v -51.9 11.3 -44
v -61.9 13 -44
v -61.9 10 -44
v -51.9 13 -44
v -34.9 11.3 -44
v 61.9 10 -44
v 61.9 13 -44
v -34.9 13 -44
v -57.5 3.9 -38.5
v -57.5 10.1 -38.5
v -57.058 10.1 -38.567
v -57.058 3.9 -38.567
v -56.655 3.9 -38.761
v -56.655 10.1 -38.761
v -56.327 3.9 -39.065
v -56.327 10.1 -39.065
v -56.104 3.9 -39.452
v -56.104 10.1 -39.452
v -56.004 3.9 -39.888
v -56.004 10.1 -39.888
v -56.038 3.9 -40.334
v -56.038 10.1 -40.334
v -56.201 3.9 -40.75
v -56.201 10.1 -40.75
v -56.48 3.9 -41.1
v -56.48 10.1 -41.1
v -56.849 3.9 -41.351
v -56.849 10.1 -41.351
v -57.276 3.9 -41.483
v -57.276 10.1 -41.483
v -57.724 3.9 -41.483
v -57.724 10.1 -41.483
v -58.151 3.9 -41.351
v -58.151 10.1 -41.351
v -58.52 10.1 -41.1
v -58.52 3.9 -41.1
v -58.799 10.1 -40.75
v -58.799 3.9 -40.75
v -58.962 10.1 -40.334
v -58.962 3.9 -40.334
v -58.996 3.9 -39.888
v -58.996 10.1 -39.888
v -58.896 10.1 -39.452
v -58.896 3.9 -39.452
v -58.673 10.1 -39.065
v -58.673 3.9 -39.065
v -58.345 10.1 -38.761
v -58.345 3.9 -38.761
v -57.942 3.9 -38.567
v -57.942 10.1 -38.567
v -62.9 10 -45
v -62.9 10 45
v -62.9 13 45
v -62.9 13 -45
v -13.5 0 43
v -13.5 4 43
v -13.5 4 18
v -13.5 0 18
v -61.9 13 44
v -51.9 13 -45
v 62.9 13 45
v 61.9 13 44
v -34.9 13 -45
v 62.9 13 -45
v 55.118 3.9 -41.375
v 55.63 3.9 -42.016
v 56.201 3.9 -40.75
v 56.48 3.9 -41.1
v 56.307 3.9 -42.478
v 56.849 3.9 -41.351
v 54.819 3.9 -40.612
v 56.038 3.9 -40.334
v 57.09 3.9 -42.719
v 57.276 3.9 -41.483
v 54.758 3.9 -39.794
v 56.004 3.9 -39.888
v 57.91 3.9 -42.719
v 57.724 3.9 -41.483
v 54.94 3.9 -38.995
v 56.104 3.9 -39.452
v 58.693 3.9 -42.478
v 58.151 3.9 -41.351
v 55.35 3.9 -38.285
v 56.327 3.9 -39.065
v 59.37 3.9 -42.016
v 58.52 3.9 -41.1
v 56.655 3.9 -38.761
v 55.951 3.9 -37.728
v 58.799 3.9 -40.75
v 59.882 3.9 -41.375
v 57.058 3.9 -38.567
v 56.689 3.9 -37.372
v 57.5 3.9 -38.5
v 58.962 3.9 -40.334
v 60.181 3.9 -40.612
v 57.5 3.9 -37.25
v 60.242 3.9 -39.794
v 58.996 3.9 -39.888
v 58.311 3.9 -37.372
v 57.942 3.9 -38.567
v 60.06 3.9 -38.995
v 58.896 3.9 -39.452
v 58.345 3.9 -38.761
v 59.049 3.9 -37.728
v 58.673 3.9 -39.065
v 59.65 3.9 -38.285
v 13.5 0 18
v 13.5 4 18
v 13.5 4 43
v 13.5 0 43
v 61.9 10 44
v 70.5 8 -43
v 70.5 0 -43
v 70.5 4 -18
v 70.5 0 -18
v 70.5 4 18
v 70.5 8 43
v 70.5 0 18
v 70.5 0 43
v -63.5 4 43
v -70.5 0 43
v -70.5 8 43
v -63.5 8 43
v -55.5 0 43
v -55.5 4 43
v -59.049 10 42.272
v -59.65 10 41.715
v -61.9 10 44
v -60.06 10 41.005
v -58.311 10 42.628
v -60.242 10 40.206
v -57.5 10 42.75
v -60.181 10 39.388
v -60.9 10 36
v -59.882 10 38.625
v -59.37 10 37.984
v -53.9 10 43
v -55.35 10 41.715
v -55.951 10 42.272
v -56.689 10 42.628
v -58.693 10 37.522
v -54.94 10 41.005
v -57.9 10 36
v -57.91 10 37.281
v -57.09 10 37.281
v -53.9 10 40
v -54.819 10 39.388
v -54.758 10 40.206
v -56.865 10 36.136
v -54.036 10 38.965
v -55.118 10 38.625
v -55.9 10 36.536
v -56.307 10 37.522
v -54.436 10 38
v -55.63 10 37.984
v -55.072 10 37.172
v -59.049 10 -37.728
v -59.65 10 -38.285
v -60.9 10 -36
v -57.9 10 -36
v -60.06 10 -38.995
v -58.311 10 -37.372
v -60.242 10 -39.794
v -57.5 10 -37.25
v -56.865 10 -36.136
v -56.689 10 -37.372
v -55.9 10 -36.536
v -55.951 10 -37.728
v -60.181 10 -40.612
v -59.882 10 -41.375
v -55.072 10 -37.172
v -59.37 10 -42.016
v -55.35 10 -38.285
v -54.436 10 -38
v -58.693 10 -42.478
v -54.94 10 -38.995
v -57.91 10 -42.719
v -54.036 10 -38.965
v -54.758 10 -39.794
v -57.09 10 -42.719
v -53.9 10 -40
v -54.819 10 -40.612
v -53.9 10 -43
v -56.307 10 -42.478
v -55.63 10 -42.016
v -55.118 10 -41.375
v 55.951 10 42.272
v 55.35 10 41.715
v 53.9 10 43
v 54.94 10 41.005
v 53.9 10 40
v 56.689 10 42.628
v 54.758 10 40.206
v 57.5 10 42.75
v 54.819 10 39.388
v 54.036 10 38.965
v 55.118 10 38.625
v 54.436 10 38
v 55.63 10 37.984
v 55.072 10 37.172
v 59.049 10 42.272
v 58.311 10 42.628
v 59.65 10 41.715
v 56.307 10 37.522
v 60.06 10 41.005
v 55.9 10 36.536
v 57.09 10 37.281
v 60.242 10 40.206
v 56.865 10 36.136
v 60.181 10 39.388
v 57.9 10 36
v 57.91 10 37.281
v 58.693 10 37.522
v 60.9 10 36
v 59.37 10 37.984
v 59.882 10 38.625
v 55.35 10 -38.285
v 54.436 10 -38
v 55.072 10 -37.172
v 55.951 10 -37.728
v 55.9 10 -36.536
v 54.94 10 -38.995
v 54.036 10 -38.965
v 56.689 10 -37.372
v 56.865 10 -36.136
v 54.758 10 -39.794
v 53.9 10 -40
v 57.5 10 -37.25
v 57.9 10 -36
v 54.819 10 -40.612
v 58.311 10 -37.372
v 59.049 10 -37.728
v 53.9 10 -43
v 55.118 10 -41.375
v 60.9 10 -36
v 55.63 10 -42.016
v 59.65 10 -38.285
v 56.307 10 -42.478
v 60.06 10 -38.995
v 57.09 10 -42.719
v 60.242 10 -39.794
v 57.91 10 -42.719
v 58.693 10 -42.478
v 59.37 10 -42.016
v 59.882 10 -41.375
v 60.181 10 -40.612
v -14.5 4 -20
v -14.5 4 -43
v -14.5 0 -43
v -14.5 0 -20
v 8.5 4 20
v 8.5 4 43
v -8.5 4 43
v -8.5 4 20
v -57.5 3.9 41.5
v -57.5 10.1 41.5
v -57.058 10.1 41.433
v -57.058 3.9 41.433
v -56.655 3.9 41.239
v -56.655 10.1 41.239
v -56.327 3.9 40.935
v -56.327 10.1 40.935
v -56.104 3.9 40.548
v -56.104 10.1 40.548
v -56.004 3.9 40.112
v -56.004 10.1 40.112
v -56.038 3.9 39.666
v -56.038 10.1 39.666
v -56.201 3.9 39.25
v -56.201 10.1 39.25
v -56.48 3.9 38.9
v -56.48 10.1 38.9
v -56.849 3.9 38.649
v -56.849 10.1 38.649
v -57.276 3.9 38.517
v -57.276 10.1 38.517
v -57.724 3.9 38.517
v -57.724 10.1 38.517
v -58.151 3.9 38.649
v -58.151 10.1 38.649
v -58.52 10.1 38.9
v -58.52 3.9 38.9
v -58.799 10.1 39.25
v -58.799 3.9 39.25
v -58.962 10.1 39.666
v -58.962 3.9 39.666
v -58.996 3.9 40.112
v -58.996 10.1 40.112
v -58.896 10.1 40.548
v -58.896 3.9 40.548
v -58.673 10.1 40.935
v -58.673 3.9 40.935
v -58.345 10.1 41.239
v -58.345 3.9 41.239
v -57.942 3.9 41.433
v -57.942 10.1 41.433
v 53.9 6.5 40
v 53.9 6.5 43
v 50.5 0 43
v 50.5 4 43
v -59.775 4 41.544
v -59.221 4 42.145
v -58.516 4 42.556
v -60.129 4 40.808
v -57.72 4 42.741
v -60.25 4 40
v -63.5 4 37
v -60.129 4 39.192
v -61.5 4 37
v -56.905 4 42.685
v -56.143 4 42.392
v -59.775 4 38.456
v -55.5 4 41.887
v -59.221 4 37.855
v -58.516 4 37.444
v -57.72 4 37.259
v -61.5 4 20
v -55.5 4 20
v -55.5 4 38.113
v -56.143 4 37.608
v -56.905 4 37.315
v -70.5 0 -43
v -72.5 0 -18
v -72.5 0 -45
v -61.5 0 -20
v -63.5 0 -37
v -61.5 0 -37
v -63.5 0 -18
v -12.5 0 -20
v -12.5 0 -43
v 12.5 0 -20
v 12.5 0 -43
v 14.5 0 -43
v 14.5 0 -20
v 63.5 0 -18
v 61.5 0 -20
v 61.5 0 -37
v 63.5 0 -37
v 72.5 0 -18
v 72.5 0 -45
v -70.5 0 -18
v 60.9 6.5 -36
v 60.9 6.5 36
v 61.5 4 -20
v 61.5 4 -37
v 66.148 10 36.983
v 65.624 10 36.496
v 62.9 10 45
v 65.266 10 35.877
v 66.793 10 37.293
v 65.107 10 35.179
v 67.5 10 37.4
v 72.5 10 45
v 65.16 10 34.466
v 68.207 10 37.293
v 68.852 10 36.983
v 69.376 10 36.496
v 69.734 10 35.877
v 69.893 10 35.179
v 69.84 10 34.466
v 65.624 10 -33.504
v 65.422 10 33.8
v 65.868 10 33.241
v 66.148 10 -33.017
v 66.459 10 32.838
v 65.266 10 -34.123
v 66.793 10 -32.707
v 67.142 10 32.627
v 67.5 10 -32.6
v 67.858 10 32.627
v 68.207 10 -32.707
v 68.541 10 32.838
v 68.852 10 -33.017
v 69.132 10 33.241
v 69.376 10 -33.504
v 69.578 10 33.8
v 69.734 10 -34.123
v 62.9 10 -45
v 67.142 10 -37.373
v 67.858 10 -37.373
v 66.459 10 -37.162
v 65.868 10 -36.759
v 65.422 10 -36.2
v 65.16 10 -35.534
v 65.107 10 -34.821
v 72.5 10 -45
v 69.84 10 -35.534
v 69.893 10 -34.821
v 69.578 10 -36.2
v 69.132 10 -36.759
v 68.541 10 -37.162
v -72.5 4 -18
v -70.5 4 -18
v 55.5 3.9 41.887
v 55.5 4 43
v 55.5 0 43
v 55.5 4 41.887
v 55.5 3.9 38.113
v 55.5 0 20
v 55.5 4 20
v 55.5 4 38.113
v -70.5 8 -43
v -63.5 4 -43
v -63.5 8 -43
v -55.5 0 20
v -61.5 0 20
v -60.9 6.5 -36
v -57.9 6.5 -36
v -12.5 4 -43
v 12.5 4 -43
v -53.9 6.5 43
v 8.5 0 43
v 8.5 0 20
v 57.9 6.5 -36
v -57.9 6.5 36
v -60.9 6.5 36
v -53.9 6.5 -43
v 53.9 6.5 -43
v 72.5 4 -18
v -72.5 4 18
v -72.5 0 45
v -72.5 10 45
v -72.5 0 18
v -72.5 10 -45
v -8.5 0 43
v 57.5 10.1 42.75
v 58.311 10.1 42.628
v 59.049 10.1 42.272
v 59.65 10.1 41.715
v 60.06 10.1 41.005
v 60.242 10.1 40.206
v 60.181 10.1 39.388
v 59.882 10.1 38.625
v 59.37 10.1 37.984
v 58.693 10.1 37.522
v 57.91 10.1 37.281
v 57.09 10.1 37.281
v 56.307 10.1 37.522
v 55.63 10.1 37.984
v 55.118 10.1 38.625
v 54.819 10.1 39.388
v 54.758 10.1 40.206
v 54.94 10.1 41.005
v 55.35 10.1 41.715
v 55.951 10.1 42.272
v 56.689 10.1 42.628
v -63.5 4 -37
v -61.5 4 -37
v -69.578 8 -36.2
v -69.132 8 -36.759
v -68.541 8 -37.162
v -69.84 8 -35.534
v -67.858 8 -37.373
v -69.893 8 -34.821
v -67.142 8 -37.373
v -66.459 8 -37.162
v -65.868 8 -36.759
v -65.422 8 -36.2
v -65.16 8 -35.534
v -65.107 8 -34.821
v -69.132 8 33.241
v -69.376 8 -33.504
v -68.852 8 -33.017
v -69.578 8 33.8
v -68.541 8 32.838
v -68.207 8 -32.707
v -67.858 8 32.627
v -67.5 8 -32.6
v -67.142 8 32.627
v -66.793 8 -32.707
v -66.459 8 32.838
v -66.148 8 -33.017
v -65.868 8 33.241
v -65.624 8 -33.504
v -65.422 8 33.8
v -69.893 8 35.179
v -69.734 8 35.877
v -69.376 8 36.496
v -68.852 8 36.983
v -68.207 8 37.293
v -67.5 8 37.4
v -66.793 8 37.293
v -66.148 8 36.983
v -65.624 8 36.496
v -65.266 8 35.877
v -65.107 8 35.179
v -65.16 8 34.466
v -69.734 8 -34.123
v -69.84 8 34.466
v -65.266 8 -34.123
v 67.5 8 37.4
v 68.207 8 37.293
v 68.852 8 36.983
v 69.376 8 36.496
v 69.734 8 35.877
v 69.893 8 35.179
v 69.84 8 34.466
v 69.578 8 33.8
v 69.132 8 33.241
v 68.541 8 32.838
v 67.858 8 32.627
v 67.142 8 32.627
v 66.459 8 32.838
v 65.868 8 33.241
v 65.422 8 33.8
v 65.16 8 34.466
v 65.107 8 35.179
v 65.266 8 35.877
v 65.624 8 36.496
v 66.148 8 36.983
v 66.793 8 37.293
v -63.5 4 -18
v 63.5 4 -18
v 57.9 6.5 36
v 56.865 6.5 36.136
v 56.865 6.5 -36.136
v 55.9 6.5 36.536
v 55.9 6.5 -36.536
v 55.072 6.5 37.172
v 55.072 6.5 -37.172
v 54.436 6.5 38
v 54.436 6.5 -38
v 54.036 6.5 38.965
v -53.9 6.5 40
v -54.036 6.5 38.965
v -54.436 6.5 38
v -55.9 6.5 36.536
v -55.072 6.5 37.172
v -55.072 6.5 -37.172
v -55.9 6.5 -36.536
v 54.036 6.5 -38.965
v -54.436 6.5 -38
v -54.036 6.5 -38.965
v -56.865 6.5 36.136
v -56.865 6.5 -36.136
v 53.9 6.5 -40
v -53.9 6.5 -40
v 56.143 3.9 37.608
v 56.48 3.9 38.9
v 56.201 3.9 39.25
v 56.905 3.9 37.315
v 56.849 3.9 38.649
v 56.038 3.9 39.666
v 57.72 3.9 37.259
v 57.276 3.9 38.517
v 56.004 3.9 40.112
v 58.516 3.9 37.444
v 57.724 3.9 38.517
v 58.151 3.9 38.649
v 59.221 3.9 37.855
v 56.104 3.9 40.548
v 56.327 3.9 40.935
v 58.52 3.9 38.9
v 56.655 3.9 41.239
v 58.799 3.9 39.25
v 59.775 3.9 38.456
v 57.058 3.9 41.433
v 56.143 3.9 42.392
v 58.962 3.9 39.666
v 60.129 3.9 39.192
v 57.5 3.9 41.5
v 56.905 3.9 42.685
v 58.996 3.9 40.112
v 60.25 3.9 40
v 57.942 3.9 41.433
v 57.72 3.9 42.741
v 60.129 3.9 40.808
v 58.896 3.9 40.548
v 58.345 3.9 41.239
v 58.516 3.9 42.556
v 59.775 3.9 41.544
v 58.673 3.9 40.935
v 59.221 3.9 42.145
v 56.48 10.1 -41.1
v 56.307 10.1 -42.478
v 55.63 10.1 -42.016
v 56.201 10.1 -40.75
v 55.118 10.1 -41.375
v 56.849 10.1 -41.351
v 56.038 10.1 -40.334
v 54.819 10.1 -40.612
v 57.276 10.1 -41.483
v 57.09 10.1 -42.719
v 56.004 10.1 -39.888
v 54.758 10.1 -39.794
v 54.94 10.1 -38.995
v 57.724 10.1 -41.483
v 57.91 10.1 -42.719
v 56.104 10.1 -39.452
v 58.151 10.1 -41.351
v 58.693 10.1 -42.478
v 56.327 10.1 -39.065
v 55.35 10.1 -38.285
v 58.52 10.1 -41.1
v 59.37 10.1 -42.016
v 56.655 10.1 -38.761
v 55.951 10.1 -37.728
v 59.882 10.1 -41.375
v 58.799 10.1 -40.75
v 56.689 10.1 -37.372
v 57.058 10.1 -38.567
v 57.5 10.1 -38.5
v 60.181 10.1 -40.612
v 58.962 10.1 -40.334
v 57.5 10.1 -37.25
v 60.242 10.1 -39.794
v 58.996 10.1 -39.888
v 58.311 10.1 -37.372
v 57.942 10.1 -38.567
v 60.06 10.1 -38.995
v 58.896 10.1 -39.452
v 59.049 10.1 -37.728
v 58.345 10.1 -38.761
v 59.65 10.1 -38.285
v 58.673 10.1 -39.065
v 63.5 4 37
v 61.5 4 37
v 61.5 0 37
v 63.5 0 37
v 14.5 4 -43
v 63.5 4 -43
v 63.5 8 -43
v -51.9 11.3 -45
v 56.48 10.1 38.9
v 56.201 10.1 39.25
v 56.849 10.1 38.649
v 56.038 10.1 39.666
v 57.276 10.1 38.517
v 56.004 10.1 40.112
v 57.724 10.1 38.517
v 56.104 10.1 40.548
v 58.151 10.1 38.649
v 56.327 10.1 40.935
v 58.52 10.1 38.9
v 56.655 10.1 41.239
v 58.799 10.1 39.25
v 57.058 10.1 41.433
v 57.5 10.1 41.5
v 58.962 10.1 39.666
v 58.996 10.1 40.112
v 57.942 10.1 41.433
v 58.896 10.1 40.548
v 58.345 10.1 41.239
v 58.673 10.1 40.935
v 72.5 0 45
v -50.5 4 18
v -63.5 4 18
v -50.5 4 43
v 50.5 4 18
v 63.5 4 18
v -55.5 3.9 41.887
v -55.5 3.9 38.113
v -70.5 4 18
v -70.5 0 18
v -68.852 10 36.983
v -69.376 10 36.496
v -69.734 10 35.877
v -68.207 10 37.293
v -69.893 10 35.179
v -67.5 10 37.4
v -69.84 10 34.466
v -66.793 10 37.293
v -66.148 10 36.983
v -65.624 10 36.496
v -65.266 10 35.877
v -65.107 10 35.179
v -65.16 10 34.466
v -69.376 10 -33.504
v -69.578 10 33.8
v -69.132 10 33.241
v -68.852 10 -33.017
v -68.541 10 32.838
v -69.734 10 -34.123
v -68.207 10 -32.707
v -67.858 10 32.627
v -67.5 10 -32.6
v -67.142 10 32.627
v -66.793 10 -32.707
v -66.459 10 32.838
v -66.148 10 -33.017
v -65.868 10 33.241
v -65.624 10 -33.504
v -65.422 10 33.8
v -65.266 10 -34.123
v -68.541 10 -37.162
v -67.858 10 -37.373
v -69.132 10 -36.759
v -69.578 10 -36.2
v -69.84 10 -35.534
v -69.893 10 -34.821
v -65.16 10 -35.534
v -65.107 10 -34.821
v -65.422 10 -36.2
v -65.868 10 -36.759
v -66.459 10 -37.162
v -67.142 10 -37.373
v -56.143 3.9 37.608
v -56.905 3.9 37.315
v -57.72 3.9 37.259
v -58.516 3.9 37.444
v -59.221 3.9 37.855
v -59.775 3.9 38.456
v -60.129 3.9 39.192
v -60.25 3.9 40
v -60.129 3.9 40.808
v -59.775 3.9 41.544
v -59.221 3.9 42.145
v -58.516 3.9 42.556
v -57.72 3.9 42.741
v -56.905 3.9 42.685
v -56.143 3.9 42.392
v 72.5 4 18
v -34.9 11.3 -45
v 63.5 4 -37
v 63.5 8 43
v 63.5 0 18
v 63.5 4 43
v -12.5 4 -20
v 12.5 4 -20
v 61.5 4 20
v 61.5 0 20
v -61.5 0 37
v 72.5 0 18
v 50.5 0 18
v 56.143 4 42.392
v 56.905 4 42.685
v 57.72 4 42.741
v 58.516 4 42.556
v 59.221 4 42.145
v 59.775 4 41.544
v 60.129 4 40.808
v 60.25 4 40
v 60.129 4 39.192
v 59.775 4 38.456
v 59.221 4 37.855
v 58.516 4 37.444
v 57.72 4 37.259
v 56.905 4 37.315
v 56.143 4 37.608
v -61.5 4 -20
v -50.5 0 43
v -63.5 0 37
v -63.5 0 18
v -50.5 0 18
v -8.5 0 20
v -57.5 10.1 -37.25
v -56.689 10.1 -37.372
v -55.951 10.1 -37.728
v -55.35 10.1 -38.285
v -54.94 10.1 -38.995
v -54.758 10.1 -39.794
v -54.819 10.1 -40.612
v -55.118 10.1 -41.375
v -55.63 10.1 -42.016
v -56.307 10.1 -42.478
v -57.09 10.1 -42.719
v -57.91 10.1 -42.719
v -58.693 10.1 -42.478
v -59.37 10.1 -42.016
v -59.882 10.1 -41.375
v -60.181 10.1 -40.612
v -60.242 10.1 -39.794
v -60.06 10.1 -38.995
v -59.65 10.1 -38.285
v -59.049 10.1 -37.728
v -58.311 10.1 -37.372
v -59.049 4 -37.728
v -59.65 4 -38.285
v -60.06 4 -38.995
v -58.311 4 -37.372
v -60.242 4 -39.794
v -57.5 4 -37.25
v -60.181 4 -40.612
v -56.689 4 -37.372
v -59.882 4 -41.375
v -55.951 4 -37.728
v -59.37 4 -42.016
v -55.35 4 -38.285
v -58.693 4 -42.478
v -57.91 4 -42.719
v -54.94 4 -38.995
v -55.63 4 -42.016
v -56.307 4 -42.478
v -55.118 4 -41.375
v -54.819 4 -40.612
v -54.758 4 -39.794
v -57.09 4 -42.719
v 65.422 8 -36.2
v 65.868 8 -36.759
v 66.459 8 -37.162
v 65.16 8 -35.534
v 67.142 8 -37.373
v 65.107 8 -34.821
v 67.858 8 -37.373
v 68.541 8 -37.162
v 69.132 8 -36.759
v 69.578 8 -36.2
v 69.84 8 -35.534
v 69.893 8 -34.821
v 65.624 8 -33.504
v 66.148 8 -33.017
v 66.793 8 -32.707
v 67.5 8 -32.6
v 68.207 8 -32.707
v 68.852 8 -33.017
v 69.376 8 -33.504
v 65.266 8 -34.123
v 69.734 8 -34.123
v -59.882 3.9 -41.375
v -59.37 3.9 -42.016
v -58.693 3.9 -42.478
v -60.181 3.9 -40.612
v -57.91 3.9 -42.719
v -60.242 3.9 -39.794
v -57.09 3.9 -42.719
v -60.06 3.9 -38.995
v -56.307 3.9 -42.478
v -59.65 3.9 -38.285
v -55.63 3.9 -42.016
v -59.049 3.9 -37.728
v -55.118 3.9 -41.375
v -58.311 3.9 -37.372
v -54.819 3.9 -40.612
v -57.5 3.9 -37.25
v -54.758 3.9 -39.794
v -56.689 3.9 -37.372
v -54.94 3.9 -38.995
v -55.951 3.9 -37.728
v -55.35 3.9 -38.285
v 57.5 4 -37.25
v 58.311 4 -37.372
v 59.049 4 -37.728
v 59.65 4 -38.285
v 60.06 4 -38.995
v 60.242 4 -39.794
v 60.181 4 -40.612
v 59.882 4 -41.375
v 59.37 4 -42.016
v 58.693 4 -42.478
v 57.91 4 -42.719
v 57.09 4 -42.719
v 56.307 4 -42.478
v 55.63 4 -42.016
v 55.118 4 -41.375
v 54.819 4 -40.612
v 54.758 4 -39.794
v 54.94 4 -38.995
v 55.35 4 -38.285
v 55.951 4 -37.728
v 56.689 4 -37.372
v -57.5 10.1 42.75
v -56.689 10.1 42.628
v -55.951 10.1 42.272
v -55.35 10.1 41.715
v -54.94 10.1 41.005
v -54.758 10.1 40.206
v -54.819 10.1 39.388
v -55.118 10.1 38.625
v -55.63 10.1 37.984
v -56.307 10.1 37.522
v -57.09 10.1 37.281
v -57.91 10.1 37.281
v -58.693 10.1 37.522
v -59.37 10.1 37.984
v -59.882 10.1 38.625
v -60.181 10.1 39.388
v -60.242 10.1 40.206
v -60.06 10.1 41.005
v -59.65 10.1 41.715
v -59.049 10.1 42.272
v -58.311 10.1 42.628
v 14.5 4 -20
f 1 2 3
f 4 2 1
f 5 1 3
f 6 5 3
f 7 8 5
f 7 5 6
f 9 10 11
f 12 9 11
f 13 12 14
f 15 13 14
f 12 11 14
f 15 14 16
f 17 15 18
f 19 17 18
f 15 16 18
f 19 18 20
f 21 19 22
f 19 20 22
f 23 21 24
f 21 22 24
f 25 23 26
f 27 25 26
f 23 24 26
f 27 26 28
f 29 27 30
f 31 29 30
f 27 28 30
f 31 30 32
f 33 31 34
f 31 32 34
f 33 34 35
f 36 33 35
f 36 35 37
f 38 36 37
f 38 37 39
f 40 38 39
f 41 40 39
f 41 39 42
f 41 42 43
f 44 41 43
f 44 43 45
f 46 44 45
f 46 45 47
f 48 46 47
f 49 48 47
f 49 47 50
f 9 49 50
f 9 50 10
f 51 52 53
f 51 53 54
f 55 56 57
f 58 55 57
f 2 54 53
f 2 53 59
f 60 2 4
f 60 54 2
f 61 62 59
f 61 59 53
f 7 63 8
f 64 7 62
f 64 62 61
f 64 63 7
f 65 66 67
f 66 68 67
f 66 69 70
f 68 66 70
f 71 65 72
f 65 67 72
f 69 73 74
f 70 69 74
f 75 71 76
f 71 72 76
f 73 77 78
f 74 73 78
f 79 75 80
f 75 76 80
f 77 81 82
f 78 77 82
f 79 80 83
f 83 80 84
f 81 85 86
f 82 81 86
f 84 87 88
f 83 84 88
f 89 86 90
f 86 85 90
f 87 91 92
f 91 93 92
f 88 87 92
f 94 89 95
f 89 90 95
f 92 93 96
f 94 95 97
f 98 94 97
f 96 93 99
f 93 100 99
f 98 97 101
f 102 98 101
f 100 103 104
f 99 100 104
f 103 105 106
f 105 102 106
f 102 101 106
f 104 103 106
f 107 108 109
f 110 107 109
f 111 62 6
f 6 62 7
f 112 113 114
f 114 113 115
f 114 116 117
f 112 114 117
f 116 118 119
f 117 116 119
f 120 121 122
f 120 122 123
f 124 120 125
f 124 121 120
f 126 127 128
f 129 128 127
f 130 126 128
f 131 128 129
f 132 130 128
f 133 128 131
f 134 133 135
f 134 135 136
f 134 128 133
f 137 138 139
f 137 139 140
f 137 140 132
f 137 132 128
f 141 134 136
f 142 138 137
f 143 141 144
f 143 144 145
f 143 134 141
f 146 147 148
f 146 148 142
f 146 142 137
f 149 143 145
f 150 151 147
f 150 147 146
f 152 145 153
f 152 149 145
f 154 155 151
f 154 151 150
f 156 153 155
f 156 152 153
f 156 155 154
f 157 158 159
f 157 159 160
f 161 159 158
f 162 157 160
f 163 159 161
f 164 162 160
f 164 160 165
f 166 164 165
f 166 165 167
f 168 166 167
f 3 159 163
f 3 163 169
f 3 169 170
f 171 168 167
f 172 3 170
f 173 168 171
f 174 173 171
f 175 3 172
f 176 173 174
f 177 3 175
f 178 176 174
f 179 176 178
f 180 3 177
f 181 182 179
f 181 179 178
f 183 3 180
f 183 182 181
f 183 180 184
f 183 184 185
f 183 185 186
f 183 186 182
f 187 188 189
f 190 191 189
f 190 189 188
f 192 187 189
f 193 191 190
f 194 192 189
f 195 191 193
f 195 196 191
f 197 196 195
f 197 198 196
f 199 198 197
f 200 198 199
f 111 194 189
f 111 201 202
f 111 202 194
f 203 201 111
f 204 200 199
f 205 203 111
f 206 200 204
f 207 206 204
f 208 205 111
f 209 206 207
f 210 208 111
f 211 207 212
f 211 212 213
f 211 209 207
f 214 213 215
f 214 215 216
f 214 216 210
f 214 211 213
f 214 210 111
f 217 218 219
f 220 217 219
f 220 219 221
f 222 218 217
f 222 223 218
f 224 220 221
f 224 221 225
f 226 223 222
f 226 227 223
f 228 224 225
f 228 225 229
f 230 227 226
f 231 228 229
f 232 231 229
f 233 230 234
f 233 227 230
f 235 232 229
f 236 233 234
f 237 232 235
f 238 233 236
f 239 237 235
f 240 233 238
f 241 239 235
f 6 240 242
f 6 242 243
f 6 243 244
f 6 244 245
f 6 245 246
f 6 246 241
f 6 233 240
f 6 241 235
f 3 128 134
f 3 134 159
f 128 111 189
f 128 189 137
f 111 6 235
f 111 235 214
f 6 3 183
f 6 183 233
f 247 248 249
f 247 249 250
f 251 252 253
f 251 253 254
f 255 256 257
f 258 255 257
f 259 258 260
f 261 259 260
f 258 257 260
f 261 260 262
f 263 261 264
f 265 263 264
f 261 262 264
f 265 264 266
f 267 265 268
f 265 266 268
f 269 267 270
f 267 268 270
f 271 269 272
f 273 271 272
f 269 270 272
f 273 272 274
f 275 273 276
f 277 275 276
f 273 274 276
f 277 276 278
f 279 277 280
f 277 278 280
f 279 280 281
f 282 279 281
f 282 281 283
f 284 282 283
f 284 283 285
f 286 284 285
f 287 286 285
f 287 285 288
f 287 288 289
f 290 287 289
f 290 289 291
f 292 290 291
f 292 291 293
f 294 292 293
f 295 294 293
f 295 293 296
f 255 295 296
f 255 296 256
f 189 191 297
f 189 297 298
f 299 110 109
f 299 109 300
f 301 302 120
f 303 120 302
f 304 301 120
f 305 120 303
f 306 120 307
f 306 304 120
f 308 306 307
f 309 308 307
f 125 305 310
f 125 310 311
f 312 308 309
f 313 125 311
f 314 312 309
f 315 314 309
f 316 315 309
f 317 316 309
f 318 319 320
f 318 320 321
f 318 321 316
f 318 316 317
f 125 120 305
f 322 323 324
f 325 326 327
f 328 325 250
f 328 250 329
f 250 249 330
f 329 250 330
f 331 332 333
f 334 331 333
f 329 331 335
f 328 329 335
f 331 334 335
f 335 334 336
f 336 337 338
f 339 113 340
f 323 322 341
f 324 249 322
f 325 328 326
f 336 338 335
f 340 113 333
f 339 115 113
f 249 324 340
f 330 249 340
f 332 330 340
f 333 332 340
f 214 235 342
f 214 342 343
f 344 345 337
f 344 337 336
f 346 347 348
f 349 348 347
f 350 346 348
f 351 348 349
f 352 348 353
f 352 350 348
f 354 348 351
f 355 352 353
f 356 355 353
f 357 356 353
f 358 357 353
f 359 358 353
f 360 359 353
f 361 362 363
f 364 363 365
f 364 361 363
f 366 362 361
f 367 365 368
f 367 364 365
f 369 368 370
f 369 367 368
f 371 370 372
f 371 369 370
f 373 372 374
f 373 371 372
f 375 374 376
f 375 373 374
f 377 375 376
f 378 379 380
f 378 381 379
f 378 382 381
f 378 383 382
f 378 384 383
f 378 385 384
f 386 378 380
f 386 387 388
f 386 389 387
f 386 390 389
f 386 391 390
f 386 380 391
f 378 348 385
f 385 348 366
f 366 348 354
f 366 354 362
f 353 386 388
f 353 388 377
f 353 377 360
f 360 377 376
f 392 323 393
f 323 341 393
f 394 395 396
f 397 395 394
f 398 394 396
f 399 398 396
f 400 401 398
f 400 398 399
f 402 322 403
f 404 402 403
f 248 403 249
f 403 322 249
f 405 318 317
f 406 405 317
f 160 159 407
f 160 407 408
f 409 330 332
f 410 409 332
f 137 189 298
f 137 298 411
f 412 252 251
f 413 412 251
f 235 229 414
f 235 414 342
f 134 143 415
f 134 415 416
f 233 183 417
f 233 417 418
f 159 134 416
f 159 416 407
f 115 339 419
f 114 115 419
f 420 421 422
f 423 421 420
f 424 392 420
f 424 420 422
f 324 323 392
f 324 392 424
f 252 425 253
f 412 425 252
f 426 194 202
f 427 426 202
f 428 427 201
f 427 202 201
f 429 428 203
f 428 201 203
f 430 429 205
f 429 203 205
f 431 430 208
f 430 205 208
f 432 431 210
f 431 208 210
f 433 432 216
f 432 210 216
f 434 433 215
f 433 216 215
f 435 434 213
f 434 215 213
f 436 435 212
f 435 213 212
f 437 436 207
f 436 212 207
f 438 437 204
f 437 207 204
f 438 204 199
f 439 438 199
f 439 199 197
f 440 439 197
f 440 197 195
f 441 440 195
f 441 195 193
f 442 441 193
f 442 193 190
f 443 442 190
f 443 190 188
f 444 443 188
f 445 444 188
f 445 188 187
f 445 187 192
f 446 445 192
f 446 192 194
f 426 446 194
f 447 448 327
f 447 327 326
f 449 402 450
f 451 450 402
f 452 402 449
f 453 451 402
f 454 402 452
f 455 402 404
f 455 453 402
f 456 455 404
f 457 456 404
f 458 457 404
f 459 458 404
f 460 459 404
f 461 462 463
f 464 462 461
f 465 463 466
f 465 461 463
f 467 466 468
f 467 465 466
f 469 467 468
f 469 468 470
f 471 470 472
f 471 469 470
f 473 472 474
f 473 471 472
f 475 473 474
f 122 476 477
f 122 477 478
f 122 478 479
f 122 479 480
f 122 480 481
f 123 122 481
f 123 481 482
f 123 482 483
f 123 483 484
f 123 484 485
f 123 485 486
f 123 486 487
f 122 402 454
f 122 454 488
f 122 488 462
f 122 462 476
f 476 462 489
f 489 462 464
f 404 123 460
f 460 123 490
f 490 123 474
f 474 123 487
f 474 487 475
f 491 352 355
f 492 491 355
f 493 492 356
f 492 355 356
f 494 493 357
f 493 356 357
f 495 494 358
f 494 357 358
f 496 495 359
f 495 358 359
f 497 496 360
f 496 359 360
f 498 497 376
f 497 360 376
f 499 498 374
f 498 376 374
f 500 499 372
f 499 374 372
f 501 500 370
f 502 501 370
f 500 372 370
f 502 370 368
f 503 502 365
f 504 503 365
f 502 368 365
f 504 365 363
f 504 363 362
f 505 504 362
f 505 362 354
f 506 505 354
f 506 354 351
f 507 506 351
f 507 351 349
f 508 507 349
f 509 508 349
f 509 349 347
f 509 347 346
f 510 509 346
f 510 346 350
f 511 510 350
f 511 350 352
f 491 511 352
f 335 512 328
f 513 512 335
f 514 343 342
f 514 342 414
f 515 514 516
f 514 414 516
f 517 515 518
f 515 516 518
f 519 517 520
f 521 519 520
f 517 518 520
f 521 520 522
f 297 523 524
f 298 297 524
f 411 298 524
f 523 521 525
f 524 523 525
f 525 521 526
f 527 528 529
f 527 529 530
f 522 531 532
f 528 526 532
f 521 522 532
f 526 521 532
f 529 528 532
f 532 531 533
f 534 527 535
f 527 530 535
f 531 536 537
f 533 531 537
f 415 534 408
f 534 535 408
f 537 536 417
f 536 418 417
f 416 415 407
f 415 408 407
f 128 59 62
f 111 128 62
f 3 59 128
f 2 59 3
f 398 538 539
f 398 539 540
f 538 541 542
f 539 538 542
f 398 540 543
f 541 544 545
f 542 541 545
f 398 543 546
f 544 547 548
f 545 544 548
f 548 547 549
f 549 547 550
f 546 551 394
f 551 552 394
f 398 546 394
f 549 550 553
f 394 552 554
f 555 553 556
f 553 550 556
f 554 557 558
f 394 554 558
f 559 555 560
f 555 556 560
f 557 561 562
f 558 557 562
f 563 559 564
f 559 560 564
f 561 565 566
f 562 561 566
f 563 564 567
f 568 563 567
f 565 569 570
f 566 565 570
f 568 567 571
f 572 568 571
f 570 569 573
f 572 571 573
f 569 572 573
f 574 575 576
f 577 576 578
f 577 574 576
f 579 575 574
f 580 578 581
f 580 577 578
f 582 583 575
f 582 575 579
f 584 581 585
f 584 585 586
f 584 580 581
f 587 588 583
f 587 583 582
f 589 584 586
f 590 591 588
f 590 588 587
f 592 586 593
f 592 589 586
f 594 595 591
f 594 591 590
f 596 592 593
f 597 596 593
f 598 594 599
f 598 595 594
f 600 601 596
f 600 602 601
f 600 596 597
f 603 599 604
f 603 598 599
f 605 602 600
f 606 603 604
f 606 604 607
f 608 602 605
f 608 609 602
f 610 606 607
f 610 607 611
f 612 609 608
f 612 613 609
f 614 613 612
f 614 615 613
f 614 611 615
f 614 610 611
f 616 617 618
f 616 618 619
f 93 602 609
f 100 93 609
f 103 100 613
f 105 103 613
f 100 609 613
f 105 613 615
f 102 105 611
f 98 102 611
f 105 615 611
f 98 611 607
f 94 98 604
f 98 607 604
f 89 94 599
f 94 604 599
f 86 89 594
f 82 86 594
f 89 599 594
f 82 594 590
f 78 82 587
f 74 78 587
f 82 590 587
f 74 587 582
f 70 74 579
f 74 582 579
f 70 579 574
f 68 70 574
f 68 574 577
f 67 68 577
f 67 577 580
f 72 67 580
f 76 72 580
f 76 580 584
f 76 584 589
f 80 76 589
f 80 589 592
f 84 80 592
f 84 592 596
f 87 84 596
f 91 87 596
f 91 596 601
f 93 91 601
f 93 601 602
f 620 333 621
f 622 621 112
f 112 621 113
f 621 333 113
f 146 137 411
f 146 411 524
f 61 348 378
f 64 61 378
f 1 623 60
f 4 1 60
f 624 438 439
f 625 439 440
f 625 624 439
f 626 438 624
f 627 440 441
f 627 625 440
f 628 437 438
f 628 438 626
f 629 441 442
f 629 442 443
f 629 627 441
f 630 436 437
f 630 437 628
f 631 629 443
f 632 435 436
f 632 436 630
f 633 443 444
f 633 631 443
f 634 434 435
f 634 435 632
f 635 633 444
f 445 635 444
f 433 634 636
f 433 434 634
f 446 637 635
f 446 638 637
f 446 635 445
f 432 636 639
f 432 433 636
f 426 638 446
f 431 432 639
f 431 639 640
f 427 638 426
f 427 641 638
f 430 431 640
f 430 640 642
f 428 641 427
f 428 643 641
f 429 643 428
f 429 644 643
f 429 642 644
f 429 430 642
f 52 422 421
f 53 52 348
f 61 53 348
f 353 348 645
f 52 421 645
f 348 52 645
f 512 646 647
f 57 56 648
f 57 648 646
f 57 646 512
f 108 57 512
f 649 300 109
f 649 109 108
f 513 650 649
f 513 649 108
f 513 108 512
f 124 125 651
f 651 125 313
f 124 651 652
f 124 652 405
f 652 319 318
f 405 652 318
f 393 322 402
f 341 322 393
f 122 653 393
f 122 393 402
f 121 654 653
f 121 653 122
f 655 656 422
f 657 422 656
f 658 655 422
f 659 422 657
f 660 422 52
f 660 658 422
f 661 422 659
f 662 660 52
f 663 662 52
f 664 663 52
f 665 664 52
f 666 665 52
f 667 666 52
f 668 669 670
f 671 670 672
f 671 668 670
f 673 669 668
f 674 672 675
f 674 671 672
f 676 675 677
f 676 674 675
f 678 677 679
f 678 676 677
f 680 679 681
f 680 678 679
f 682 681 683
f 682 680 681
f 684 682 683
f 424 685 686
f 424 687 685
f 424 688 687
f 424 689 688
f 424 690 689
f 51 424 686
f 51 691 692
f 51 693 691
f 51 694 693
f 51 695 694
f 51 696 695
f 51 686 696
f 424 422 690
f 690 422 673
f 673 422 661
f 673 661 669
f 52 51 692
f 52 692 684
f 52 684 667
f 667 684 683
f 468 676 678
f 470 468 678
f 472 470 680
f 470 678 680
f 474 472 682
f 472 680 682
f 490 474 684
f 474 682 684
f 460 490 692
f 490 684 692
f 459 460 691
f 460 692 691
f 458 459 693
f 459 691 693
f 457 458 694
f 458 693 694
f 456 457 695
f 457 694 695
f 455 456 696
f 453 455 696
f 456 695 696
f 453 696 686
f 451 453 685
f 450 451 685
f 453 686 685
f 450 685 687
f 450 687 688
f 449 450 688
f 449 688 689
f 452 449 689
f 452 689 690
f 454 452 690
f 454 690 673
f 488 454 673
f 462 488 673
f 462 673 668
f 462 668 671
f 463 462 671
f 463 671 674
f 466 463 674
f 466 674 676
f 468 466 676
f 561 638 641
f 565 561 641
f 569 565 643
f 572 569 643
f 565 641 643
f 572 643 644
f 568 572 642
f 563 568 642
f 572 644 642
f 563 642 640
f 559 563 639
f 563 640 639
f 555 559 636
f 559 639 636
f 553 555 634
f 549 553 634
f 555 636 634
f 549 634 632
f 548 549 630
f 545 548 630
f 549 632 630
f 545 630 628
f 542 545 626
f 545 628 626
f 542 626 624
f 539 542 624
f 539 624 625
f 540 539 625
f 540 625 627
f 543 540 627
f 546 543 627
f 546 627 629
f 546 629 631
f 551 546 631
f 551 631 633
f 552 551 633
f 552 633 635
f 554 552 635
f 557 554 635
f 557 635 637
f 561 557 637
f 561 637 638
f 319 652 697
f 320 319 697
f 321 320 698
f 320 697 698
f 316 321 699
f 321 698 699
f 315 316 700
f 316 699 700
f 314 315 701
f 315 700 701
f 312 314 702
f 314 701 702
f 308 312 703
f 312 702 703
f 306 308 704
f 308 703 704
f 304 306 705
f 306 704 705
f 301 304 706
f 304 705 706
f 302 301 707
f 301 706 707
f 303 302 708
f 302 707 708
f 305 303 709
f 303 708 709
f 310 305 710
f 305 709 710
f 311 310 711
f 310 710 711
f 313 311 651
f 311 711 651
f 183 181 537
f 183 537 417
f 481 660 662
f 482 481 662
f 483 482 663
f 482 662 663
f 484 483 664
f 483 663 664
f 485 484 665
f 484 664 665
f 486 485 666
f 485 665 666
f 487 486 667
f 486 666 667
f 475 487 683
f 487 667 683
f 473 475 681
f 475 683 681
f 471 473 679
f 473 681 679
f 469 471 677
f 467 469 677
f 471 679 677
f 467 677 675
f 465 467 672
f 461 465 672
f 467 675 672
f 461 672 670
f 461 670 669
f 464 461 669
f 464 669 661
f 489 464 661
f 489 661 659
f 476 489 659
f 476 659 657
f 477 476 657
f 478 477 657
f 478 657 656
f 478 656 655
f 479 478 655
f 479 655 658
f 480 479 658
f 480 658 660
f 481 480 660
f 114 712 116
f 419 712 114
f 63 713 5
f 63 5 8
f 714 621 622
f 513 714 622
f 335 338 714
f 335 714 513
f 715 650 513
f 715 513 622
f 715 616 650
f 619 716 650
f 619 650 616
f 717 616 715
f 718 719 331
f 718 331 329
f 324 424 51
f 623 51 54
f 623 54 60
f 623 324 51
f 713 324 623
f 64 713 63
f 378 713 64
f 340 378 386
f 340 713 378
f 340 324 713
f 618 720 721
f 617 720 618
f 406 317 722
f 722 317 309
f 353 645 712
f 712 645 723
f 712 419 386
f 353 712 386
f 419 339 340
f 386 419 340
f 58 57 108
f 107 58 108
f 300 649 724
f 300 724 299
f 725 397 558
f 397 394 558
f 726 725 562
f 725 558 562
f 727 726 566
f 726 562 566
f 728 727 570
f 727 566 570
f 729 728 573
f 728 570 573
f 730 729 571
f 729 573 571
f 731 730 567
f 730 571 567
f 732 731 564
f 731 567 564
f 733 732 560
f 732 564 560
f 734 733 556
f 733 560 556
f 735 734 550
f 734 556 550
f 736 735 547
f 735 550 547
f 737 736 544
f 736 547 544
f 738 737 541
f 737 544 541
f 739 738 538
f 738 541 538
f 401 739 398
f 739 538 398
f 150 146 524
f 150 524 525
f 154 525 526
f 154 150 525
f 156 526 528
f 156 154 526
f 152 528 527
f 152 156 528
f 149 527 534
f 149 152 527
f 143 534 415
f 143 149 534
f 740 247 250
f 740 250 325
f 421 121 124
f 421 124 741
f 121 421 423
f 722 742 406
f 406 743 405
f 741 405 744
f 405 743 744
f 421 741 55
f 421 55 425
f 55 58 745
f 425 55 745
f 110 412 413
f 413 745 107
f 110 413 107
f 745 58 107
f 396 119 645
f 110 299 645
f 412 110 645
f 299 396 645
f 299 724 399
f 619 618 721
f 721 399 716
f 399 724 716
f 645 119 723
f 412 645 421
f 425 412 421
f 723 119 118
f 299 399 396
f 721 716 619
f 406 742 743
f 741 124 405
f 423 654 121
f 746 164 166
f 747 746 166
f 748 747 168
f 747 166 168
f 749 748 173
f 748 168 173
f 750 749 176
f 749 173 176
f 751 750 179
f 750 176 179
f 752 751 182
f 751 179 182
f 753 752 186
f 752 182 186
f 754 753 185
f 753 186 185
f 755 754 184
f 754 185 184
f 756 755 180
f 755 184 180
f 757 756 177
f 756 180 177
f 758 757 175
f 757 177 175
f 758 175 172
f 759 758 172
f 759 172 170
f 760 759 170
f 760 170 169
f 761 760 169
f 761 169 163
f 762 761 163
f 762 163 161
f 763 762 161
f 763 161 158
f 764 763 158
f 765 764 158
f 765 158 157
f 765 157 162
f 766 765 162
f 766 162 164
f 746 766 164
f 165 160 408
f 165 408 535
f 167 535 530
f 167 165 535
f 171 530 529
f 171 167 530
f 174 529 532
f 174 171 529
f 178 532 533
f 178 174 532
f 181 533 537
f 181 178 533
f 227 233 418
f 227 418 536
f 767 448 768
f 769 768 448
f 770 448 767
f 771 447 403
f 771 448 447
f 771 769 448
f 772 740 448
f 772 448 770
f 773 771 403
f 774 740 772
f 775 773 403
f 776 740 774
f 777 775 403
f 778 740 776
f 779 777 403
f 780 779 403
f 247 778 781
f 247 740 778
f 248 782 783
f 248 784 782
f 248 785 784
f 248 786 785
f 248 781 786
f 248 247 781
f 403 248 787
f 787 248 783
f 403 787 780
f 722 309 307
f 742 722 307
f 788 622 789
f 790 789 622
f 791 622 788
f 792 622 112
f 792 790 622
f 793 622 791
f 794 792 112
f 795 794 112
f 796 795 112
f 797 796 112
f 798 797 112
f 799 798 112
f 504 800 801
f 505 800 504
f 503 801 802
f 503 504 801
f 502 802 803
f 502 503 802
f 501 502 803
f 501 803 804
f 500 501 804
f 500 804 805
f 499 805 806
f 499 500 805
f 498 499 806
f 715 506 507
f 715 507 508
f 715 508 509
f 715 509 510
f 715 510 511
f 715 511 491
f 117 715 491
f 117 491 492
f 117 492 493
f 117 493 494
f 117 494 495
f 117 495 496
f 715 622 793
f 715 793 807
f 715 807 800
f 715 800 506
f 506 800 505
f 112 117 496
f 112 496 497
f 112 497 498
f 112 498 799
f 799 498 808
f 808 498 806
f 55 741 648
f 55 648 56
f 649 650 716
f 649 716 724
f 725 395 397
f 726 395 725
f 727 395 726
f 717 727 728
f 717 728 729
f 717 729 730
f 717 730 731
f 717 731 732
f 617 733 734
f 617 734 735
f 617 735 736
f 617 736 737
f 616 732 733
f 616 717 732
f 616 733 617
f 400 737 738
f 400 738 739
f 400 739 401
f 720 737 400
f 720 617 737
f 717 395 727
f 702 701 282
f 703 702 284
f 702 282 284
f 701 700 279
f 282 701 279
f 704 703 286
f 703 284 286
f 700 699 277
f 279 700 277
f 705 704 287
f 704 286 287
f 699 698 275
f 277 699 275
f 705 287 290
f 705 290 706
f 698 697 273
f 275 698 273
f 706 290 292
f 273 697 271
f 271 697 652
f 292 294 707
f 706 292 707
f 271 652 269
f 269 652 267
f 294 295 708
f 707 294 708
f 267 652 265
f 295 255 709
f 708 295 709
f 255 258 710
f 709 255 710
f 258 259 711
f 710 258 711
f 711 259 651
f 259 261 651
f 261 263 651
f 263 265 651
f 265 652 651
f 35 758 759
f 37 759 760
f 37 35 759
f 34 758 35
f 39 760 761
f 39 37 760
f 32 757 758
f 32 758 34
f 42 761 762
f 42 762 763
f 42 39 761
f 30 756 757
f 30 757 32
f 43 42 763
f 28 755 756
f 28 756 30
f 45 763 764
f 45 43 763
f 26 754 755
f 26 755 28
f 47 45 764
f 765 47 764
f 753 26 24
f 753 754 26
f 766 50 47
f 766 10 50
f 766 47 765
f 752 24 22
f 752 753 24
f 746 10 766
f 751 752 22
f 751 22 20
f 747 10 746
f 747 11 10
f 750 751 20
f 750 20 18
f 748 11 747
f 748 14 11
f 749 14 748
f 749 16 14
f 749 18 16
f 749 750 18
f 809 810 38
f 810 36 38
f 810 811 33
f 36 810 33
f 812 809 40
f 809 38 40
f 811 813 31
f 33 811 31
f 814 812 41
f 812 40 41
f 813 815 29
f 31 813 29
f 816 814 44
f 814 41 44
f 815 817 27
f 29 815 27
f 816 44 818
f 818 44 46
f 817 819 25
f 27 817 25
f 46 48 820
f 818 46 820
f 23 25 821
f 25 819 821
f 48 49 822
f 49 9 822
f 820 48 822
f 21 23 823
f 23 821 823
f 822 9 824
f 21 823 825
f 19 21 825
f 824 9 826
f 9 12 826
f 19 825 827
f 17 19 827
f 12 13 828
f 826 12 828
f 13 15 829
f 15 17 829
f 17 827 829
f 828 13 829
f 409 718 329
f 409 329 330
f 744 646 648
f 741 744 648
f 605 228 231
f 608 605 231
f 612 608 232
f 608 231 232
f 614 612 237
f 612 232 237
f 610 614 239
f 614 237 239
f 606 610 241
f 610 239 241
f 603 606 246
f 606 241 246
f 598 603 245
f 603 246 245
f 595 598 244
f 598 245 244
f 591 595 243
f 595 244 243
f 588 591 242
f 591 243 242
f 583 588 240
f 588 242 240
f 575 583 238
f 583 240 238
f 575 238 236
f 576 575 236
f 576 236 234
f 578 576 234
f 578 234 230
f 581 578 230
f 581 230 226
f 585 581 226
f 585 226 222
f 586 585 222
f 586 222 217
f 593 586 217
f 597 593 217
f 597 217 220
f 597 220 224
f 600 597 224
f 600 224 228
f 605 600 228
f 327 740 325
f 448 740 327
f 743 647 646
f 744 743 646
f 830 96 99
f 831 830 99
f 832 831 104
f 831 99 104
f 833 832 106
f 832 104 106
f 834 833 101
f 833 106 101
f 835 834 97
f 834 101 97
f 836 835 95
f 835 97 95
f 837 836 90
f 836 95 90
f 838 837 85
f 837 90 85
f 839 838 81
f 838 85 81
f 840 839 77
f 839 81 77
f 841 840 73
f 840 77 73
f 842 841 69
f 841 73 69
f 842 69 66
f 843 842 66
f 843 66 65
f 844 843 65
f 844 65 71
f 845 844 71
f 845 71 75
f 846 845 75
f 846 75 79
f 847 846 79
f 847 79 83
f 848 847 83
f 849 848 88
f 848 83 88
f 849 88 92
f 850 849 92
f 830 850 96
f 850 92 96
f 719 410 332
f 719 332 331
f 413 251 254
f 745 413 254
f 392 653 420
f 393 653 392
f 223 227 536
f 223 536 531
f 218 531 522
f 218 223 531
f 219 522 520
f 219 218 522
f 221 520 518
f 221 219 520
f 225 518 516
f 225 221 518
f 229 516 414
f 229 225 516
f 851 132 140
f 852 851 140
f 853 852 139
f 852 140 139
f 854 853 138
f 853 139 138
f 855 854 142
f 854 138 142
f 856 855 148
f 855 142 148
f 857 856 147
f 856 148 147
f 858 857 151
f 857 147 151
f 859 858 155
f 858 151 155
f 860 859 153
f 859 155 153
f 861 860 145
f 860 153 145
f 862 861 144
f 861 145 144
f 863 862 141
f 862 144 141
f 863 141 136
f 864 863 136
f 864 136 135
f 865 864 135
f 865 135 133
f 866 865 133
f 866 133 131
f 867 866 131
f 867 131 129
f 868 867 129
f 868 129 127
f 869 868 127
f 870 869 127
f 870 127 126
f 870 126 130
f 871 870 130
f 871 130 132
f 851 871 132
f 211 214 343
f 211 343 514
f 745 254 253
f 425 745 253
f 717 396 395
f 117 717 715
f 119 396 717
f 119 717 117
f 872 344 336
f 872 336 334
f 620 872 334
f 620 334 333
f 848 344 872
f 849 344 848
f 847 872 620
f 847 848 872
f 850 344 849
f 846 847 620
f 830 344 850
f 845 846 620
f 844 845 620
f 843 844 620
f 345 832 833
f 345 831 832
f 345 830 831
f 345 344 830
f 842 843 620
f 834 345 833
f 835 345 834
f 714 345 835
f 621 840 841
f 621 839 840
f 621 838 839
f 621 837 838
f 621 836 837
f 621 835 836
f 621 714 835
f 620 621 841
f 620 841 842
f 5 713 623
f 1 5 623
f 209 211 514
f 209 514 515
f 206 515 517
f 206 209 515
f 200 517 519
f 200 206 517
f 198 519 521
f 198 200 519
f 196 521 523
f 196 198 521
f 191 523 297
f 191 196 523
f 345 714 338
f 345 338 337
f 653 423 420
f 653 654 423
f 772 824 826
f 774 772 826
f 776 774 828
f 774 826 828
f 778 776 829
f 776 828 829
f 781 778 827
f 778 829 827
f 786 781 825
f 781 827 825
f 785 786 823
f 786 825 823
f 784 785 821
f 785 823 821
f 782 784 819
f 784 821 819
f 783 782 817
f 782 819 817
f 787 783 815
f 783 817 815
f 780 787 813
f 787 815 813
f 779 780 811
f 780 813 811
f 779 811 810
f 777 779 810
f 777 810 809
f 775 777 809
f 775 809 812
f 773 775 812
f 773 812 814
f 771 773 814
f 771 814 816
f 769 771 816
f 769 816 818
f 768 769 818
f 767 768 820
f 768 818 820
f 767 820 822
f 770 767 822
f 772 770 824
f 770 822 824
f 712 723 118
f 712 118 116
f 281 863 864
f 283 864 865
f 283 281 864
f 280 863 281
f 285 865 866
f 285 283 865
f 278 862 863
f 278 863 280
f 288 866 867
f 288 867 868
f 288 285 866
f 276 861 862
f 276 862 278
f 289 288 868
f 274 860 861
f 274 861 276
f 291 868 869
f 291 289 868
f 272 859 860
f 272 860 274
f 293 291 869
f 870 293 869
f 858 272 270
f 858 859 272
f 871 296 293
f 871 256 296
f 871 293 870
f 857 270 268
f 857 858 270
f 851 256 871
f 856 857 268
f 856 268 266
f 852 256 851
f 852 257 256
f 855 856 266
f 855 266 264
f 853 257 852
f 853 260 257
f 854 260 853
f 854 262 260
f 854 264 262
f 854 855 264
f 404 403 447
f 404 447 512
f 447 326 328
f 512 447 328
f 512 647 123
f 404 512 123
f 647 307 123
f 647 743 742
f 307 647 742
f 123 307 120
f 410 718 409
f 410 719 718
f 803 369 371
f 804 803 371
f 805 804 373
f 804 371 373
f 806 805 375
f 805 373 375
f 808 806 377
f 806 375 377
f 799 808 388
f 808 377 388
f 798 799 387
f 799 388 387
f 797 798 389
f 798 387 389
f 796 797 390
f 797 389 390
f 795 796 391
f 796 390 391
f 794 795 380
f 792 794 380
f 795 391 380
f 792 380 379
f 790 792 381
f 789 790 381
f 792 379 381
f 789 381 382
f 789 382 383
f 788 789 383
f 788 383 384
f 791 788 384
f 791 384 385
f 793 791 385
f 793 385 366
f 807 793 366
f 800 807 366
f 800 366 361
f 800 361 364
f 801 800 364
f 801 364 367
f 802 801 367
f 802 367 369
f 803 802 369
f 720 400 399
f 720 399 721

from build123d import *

# Parameters (mm, degrees)
SKETCH_1_W           = 145
SKETCH_1_H           = 90
EXTRUDE_1_DEPTH      = 10
SKETCH_2_W           = 125.8
SKETCH_2_H           = 90
EXTRUDE_2_DEPTH      = 3
SKETCH_3_W           = 123.8
SKETCH_3_H           = 88
CUT_EXTRUDE_1_DEPTH  = 3
CUT_EXTRUDE_2_DEPTH  = 3.5
SKETCH_6_W           = 141
SKETCH_6_H           = 86
CUT_EXTRUDE_3_DEPTH  = 4
SKETCH_7_W           = 36
SKETCH_7_H           = 6
CUT_EXTRUDE_4_DEPTH  = 153.377819908
SKETCH_8_W           = 7
SKETCH_8_H           = 86
CUT_EXTRUDE_5_DEPTH  = 4
EXTRUDE_6_DEPTH      = 4
EXTRUDE_7_DEPTH      = 4
EXTRUDE_8_DEPTH      = 0.1
EXTRUDE_8_DEPTH_BACK = 6.1
SKETCH_16_R          = 2.75
SKETCH_17_R          = 1.5
CUT_EXTRUDE_8_DEPTH  = 86.925898308
SKETCH_18_R          = 2.4
CUT_EXTRUDE_9_DEPTH  = 86.914201387
SKETCH_19_W          = 17
SKETCH_19_H          = 2.7
CUT_EXTRUDE_10_DEPTH = 3


with BuildPart() as part:
    # Эскиз1 → Бобышка-Вытянуть1 (new body)
    with BuildSketch(Plane(origin=(0, 0, 0), x_dir=(1, 0, 0), z_dir=(0, 1, 0))):
        Rectangle(SKETCH_1_W, SKETCH_1_H)
    extrude(amount=EXTRUDE_1_DEPTH)

    # Эскиз2 → Бобышка-Вытянуть2 (add)
    with BuildSketch(Plane(origin=(0, 10, 0), x_dir=(1, 0, 0), z_dir=(0, 1, 0))):
        Rectangle(SKETCH_2_W, SKETCH_2_H)
    extrude(amount=EXTRUDE_2_DEPTH)

    # Эскиз3 → Вырез-Вытянуть1 (cut)
    with BuildSketch(Plane(origin=(0, 13, 0), x_dir=(1, 0, 0), z_dir=(0, 1, 0))):
        Rectangle(SKETCH_3_W, SKETCH_3_H)
    extrude(amount=-CUT_EXTRUDE_1_DEPTH, mode=Mode.SUBTRACT)

    # Эскиз4 → Вырез-Вытянуть2 (cut)
    with BuildSketch(Plane(origin=(0, 10, 0), x_dir=(1, 0, 0), z_dir=(0, 1, 0))):
        with BuildLine():
            Line((-53.9, 43), (53.9, 43))
            Line((53.9, 43), (53.9, 40))
            ThreePointArc((53.9, 40), (55.071572875, 37.171572875), (57.9, 36))
            Line((57.9, 36), (60.9, 36))
            Line((60.9, 36), (60.9, -36))
            Line((60.9, -36), (57.9, -36))
            ThreePointArc((57.9, -36), (55.071572875, -37.171572875), (53.9, -40))
            Line((53.9, -40), (53.9, -43))
            Line((53.9, -43), (-53.9, -43))
            Line((-53.9, -43), (-53.9, -40))
            ThreePointArc((-53.9, -40), (-55.071572875, -37.171572875), (-57.9, -36))
            Line((-57.9, -36), (-60.9, -36))
            Line((-60.9, -36), (-60.9, 36))
            Line((-60.9, 36), (-57.9, 36))
            ThreePointArc((-57.9, 36), (-55.071572875, 37.171572875), (-53.9, 40))
            Line((-53.9, 40), (-53.9, 43))
        make_face()
    extrude(amount=-CUT_EXTRUDE_2_DEPTH, mode=Mode.SUBTRACT)

    # Эскиз6 → Вырез-Вытянуть3 (cut)
    with BuildSketch(Plane.XZ):
        Rectangle(SKETCH_6_W, SKETCH_6_H)
    extrude(amount=-CUT_EXTRUDE_3_DEPTH, mode=Mode.SUBTRACT)

    # Эскиз7 → Вырез-Вытянуть4 (cut, through all)
    with BuildSketch(Plane(origin=(72.5, 0, 0), x_dir=(0, 0, -1), z_dir=(1, 0, 0))):
        with Locations((0, 1)):
            Rectangle(SKETCH_7_W, SKETCH_7_H)
    extrude(amount=-CUT_EXTRUDE_4_DEPTH, mode=Mode.SUBTRACT)

    # Эскиз8 → Вырез-Вытянуть5 (cut)
    with BuildSketch(Plane.XZ.offset(-4)):
        with Locations((-67, 0)):
            Rectangle(SKETCH_8_W, SKETCH_8_H)
        with Locations((67, 0)):
            Rectangle(SKETCH_8_W, SKETCH_8_H)
    extrude(amount=-CUT_EXTRUDE_5_DEPTH, mode=Mode.SUBTRACT)

    # Эскиз14 → Бобышка-Вытянуть6 (add)
    with BuildSketch(Plane.XZ.offset(-4)):
        Polygon((-63.5, -37), (-63.5, -18), (63.5, -18), (63.5, -37), (61.5, -37), (61.5, -20), (14.5, -20), (14.5, -43), (12.5, -43), (12.5, -20), (-12.5, -20), (-12.5, -43), (-14.5, -43), (-14.5, -20), (-61.5, -20), (-61.5, -37), align=None)
    extrude(amount=EXTRUDE_6_DEPTH)

    # Эскиз15 → Бобышка-Вытянуть7 (add)
    with BuildSketch(Plane.XZ.offset(-4)):
        Polygon((-61.5, 37), (-63.5, 37), (-63.5, 18), (-50.5, 18), (-50.5, 43), (-55.5, 43), (-55.5, 20), (-61.5, 20), align=None)
        Polygon((63.5, 37), (63.5, 18), (50.5, 18), (50.5, 43), (55.5, 43), (55.5, 20), (61.5, 20), (61.5, 37), align=None)
        Polygon((-13.5, 43), (-13.5, 18), (13.5, 18), (13.5, 43), (8.5, 43), (8.5, 20), (-8.5, 20), (-8.5, 43), align=None)
    extrude(amount=EXTRUDE_7_DEPTH)

    # Эскиз16 → Бобышка-Вытянуть8 (add, two sides: drawn at the far end of the back side and taken through both)
    with BuildSketch(Plane(origin=(0, 10, 0), x_dir=(1, 0, 0), z_dir=(0, 1, 0)).offset(-EXTRUDE_8_DEPTH_BACK)):
        with Locations(Location((-57.5, 40, 0), (0, 0, 270))):
            Circle(SKETCH_16_R)
        with Locations(Location((57.5, 40, 0), (0, 0, 270))):
            Circle(SKETCH_16_R)
        with Locations(Location((-57.5, -40, 0), (0, 0, 270))):
            Circle(SKETCH_16_R)
        with Locations(Location((57.5, -40, 0), (0, 0, 270))):
            Circle(SKETCH_16_R)
    extrude(amount=EXTRUDE_8_DEPTH + EXTRUDE_8_DEPTH_BACK)

    # Эскиз17 → Вырез-Вытянуть8 (cut, through all)
    with BuildSketch(Plane(origin=(0, 10.1, 0), x_dir=(1, 0, 0), z_dir=(0, 1, 0))):
        with Locations(Location((-57.5, 40, 0), (0, 0, 270))):
            Circle(SKETCH_17_R)
        with Locations(Location((57.5, 40, 0), (0, 0, 270))):
            Circle(SKETCH_17_R)
        with Locations(Location((-57.5, -40, 0), (0, 0, 270))):
            Circle(SKETCH_17_R)
        with Locations(Location((57.5, -40, 0), (0, 0, 270))):
            Circle(SKETCH_17_R)
    extrude(amount=-CUT_EXTRUDE_8_DEPTH, mode=Mode.SUBTRACT)

    # Эскиз18 → Вырез-Вытянуть9 (cut, through all)
    with BuildSketch(Plane(origin=(0, 10, 0), x_dir=(1, 0, 0), z_dir=(0, 1, 0))):
        with Locations(Location((-67.5, 35, 0), (0, 0, 270))):
            Circle(SKETCH_18_R)
        with Locations(Location((-67.5, -35, 0), (0, 0, 270))):
            Circle(SKETCH_18_R)
        with Locations(Location((67.5, 35, 0), (0, 0, 270))):
            Circle(SKETCH_18_R)
        with Locations(Location((67.5, -35, 0), (0, 0, 270))):
            Circle(SKETCH_18_R)
    extrude(amount=-CUT_EXTRUDE_9_DEPTH, mode=Mode.SUBTRACT)

    # Эскиз19 → Вырез-Вытянуть10 (cut)
    with BuildSketch(Plane(origin=(0, 0, -45), x_dir=(-1, 0, 0), z_dir=(0, 0, -1))):
        with Locations((43.4, 12.65)):
            Rectangle(SKETCH_19_W, SKETCH_19_H)
    extrude(amount=-CUT_EXTRUDE_10_DEPTH, mode=Mode.SUBTRACT)


solid = part.part
